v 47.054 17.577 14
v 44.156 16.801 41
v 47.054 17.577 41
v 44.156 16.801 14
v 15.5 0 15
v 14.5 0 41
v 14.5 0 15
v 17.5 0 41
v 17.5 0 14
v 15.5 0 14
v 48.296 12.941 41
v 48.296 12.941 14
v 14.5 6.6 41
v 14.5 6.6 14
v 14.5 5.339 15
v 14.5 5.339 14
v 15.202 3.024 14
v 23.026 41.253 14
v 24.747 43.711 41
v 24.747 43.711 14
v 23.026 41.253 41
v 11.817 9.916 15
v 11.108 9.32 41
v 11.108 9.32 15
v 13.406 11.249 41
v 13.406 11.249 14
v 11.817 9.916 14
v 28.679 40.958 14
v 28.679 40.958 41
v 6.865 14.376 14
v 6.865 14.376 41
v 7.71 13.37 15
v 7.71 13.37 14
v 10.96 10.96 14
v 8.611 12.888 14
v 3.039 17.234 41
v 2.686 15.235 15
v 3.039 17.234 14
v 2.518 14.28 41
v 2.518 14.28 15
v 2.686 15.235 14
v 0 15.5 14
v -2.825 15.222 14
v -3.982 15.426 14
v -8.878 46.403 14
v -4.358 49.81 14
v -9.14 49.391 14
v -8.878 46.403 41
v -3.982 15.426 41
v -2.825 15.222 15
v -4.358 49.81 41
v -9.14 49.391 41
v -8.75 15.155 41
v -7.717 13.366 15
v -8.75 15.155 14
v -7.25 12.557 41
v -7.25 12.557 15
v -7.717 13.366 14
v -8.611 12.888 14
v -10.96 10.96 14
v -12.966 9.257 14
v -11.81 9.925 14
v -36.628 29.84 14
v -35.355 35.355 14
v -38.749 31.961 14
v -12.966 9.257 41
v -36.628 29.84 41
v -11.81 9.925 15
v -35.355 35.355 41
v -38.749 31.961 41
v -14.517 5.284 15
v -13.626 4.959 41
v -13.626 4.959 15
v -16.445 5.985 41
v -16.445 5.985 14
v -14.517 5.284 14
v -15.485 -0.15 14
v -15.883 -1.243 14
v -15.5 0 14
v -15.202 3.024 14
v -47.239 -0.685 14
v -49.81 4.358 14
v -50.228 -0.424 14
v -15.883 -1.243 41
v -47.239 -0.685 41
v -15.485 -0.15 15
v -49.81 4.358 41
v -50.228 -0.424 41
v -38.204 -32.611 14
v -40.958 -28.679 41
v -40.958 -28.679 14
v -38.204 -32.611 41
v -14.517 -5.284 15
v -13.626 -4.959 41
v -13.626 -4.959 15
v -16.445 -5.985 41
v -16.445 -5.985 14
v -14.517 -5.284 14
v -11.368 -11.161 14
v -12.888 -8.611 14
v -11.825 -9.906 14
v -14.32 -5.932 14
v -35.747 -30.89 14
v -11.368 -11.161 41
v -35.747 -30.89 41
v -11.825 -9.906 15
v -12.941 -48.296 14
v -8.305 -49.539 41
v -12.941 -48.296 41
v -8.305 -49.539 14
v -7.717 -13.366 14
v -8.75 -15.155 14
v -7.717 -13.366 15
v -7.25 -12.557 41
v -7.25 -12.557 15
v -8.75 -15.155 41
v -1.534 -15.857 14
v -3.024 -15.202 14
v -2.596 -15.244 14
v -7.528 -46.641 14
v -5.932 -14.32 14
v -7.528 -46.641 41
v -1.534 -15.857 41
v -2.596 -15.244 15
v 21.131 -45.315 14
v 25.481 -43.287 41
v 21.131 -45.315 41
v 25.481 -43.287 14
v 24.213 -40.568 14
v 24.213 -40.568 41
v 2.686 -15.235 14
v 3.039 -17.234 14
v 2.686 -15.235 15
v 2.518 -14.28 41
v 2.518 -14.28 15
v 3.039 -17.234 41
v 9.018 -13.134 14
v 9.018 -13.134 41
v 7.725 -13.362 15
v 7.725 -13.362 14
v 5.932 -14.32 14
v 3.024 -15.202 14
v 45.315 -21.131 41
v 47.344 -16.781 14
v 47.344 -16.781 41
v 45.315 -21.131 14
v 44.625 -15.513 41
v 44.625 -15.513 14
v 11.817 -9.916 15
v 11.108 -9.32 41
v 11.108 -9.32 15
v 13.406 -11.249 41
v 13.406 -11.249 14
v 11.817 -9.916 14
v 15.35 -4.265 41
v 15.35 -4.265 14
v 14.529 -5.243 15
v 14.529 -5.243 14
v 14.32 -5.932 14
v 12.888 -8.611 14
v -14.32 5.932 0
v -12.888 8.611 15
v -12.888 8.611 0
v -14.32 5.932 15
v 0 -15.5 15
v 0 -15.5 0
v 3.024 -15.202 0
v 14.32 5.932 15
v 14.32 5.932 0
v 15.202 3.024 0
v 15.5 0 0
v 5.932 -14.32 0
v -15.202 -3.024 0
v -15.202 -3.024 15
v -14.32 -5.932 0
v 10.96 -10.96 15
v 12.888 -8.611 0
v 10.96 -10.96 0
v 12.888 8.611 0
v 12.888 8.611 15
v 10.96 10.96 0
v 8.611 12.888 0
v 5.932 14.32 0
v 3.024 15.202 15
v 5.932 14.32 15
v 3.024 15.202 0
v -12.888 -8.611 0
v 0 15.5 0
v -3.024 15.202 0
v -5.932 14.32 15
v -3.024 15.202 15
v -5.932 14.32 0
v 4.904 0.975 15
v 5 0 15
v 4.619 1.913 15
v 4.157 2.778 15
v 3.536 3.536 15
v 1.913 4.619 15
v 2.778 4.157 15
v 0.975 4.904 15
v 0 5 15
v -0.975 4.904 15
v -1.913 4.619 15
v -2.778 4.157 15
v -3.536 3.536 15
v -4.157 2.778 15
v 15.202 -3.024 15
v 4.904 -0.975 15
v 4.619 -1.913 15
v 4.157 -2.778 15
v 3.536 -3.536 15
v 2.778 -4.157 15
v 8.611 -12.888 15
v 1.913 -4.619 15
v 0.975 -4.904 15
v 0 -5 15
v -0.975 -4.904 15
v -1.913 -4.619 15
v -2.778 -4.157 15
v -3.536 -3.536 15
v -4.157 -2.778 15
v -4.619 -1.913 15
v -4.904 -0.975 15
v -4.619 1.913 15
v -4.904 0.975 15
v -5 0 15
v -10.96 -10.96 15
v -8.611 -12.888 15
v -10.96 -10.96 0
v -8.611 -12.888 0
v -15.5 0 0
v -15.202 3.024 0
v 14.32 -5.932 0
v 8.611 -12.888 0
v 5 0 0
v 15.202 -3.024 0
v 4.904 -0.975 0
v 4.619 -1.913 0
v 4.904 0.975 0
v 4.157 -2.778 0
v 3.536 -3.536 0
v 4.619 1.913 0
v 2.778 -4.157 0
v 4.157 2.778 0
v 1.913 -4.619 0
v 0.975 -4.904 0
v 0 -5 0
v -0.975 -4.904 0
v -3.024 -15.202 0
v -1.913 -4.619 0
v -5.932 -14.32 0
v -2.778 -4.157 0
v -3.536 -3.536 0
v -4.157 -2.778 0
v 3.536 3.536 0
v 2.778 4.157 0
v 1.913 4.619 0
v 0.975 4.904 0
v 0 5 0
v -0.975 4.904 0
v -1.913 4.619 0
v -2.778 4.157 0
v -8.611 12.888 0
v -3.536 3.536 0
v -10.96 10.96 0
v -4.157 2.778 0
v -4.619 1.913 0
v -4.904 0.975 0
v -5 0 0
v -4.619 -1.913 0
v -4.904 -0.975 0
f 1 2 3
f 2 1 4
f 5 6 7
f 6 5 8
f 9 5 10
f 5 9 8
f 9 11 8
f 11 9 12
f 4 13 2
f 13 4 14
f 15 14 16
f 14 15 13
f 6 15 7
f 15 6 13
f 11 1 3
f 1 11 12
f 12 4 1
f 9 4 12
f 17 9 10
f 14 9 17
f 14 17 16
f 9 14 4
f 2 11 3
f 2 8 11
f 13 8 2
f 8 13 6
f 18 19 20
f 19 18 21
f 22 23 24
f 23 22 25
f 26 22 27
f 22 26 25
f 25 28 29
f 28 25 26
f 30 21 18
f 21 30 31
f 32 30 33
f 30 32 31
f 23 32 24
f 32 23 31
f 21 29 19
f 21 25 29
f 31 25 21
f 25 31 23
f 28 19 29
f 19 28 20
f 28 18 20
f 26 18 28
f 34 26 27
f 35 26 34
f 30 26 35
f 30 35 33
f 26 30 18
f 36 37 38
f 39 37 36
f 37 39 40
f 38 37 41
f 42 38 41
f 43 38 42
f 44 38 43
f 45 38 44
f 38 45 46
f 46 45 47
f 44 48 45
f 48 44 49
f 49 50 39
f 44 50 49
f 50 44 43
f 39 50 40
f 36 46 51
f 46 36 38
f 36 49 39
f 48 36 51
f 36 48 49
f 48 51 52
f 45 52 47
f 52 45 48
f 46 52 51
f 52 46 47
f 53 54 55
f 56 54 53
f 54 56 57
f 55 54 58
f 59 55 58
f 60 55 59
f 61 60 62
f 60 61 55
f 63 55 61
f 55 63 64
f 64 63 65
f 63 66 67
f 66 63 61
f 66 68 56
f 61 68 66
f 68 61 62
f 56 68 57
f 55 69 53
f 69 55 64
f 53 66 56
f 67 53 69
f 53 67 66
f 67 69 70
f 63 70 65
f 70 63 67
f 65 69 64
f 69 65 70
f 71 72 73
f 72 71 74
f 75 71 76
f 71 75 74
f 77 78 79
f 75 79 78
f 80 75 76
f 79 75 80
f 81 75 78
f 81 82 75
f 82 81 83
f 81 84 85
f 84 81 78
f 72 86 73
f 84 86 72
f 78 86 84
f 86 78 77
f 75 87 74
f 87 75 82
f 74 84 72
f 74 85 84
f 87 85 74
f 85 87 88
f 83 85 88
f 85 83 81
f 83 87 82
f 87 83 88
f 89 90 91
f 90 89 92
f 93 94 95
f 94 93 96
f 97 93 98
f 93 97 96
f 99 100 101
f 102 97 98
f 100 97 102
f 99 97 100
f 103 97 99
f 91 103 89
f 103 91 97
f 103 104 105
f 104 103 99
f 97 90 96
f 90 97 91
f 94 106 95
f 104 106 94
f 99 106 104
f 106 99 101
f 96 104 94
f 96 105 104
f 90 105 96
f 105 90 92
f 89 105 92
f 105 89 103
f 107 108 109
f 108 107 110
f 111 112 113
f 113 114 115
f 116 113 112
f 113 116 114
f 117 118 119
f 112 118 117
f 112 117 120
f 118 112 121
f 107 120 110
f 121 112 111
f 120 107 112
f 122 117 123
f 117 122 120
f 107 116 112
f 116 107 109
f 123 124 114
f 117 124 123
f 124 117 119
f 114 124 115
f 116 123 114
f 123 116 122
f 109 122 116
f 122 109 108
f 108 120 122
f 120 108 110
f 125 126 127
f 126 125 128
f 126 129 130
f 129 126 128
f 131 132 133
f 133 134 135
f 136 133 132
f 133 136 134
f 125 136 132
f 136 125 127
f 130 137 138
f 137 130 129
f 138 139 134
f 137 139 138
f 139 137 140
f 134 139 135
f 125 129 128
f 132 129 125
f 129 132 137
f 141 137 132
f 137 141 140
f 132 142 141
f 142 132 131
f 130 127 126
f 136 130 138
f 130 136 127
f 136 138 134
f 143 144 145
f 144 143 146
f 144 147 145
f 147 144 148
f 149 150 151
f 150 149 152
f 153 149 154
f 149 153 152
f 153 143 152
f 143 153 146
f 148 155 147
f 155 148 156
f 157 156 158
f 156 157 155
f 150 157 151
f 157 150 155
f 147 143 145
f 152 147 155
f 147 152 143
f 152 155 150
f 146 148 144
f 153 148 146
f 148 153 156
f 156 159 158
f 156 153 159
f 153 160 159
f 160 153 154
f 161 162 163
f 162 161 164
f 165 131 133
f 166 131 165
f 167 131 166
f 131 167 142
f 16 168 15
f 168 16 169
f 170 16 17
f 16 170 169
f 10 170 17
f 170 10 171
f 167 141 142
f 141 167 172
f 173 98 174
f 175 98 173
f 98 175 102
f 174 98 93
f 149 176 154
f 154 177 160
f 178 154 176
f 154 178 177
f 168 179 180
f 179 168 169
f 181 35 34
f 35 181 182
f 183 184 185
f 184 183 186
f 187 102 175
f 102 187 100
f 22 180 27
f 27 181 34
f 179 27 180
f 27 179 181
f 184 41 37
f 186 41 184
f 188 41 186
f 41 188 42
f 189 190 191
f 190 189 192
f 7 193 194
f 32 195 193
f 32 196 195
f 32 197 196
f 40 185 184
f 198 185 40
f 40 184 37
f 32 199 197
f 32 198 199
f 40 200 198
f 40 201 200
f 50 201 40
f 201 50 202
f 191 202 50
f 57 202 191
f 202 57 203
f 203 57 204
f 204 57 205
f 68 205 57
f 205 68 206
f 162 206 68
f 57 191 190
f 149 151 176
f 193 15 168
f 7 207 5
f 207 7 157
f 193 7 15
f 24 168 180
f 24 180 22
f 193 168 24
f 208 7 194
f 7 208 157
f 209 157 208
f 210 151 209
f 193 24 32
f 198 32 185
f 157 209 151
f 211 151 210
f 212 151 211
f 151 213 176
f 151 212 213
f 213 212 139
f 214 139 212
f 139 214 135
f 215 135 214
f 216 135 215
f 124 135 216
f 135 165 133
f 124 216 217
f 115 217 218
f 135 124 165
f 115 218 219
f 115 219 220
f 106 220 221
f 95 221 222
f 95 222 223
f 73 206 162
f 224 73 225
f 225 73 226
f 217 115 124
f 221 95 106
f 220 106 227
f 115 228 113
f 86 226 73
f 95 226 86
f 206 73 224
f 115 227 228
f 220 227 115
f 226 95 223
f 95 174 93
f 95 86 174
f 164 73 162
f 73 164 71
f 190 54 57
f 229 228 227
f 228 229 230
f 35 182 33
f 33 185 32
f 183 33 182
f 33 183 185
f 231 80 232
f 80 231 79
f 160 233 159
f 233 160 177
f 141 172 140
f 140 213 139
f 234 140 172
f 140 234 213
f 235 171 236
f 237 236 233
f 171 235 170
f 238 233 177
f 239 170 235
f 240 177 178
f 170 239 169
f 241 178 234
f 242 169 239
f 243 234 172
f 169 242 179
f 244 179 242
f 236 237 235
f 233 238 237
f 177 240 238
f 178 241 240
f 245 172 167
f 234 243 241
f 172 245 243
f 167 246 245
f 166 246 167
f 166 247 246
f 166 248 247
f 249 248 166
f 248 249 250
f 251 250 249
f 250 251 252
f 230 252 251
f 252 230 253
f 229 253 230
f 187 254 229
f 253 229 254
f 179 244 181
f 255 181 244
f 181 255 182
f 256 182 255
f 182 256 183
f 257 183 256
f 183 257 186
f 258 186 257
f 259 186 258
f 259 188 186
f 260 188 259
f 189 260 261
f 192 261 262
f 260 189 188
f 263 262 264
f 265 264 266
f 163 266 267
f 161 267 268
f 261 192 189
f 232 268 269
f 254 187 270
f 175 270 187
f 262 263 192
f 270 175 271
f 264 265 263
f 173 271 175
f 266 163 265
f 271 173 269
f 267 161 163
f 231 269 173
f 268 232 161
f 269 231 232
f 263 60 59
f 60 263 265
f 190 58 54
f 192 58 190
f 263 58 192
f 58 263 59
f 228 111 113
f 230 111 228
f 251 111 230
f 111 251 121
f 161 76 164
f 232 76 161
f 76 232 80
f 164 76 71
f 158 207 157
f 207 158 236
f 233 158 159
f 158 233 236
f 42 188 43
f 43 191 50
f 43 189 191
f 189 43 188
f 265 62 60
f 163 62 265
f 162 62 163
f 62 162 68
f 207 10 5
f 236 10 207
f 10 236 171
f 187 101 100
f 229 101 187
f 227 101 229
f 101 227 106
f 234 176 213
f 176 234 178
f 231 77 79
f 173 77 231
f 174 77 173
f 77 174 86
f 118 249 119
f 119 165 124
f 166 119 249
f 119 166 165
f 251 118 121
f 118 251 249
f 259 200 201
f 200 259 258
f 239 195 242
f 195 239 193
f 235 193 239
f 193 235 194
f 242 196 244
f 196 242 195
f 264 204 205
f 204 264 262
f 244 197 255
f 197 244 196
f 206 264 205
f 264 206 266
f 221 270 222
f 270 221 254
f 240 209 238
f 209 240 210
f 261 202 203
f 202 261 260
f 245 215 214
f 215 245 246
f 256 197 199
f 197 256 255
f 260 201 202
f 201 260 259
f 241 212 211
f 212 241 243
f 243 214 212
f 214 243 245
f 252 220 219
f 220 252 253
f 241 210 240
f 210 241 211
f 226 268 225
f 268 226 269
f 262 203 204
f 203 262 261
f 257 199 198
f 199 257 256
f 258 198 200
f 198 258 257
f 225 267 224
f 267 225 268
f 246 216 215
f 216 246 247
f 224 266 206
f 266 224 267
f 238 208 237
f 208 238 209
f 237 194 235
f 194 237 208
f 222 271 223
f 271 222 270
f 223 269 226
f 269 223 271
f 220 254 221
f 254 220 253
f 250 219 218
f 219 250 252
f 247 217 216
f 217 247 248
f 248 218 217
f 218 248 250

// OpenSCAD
$fn = 32;

// ----------------------------------------------------------------------
// Impeller: 100 mm, 9 blades, 41 mm tall
// ----------------------------------------------------------------------

// --- parameters (mm) ---
boss_d = 31;              // hub diameter
boss_h = 15;              // hub height
rotor_d = 100;            // outer diameter over the blades
vane_count = 9;           // number of blades
blade_t = 3;              // blade thickness
blade_h = 26;             // blade height
blade_in_r = 14.5;        // blade root radius
blade_out_r = 47;         // blade tip radius
sweep = 15;               // blade sweep, degrees
bore_d = 10;              // shaft bore

module hub() {
  cylinder(h = boss_h, d = boss_d);
}

module blade() {
  /* blade swept between two boxes: hull of the root and the tip section */
  hull() {
    translate([blade_in_r, 0, boss_h - 1])
      cube([blade_t, blade_t * 2.2, blade_h + 1], center = false);
    rotate([0, 0, sweep])
      translate([blade_out_r, 0, boss_h - 1])
        cube([blade_t, blade_t * 1.6, blade_h + 1], center = false);
  }
}

module blades() {
  for (i = [0 : vane_count - 1])
    rotate([0, 0, i * 360 / vane_count]) blade();
}

difference() {
  union() {
    hub();
    blades();
  }
  translate([0, 0, -1]) cylinder(h = boss_h + blade_h + 0 + 3, d = bore_d);
}
